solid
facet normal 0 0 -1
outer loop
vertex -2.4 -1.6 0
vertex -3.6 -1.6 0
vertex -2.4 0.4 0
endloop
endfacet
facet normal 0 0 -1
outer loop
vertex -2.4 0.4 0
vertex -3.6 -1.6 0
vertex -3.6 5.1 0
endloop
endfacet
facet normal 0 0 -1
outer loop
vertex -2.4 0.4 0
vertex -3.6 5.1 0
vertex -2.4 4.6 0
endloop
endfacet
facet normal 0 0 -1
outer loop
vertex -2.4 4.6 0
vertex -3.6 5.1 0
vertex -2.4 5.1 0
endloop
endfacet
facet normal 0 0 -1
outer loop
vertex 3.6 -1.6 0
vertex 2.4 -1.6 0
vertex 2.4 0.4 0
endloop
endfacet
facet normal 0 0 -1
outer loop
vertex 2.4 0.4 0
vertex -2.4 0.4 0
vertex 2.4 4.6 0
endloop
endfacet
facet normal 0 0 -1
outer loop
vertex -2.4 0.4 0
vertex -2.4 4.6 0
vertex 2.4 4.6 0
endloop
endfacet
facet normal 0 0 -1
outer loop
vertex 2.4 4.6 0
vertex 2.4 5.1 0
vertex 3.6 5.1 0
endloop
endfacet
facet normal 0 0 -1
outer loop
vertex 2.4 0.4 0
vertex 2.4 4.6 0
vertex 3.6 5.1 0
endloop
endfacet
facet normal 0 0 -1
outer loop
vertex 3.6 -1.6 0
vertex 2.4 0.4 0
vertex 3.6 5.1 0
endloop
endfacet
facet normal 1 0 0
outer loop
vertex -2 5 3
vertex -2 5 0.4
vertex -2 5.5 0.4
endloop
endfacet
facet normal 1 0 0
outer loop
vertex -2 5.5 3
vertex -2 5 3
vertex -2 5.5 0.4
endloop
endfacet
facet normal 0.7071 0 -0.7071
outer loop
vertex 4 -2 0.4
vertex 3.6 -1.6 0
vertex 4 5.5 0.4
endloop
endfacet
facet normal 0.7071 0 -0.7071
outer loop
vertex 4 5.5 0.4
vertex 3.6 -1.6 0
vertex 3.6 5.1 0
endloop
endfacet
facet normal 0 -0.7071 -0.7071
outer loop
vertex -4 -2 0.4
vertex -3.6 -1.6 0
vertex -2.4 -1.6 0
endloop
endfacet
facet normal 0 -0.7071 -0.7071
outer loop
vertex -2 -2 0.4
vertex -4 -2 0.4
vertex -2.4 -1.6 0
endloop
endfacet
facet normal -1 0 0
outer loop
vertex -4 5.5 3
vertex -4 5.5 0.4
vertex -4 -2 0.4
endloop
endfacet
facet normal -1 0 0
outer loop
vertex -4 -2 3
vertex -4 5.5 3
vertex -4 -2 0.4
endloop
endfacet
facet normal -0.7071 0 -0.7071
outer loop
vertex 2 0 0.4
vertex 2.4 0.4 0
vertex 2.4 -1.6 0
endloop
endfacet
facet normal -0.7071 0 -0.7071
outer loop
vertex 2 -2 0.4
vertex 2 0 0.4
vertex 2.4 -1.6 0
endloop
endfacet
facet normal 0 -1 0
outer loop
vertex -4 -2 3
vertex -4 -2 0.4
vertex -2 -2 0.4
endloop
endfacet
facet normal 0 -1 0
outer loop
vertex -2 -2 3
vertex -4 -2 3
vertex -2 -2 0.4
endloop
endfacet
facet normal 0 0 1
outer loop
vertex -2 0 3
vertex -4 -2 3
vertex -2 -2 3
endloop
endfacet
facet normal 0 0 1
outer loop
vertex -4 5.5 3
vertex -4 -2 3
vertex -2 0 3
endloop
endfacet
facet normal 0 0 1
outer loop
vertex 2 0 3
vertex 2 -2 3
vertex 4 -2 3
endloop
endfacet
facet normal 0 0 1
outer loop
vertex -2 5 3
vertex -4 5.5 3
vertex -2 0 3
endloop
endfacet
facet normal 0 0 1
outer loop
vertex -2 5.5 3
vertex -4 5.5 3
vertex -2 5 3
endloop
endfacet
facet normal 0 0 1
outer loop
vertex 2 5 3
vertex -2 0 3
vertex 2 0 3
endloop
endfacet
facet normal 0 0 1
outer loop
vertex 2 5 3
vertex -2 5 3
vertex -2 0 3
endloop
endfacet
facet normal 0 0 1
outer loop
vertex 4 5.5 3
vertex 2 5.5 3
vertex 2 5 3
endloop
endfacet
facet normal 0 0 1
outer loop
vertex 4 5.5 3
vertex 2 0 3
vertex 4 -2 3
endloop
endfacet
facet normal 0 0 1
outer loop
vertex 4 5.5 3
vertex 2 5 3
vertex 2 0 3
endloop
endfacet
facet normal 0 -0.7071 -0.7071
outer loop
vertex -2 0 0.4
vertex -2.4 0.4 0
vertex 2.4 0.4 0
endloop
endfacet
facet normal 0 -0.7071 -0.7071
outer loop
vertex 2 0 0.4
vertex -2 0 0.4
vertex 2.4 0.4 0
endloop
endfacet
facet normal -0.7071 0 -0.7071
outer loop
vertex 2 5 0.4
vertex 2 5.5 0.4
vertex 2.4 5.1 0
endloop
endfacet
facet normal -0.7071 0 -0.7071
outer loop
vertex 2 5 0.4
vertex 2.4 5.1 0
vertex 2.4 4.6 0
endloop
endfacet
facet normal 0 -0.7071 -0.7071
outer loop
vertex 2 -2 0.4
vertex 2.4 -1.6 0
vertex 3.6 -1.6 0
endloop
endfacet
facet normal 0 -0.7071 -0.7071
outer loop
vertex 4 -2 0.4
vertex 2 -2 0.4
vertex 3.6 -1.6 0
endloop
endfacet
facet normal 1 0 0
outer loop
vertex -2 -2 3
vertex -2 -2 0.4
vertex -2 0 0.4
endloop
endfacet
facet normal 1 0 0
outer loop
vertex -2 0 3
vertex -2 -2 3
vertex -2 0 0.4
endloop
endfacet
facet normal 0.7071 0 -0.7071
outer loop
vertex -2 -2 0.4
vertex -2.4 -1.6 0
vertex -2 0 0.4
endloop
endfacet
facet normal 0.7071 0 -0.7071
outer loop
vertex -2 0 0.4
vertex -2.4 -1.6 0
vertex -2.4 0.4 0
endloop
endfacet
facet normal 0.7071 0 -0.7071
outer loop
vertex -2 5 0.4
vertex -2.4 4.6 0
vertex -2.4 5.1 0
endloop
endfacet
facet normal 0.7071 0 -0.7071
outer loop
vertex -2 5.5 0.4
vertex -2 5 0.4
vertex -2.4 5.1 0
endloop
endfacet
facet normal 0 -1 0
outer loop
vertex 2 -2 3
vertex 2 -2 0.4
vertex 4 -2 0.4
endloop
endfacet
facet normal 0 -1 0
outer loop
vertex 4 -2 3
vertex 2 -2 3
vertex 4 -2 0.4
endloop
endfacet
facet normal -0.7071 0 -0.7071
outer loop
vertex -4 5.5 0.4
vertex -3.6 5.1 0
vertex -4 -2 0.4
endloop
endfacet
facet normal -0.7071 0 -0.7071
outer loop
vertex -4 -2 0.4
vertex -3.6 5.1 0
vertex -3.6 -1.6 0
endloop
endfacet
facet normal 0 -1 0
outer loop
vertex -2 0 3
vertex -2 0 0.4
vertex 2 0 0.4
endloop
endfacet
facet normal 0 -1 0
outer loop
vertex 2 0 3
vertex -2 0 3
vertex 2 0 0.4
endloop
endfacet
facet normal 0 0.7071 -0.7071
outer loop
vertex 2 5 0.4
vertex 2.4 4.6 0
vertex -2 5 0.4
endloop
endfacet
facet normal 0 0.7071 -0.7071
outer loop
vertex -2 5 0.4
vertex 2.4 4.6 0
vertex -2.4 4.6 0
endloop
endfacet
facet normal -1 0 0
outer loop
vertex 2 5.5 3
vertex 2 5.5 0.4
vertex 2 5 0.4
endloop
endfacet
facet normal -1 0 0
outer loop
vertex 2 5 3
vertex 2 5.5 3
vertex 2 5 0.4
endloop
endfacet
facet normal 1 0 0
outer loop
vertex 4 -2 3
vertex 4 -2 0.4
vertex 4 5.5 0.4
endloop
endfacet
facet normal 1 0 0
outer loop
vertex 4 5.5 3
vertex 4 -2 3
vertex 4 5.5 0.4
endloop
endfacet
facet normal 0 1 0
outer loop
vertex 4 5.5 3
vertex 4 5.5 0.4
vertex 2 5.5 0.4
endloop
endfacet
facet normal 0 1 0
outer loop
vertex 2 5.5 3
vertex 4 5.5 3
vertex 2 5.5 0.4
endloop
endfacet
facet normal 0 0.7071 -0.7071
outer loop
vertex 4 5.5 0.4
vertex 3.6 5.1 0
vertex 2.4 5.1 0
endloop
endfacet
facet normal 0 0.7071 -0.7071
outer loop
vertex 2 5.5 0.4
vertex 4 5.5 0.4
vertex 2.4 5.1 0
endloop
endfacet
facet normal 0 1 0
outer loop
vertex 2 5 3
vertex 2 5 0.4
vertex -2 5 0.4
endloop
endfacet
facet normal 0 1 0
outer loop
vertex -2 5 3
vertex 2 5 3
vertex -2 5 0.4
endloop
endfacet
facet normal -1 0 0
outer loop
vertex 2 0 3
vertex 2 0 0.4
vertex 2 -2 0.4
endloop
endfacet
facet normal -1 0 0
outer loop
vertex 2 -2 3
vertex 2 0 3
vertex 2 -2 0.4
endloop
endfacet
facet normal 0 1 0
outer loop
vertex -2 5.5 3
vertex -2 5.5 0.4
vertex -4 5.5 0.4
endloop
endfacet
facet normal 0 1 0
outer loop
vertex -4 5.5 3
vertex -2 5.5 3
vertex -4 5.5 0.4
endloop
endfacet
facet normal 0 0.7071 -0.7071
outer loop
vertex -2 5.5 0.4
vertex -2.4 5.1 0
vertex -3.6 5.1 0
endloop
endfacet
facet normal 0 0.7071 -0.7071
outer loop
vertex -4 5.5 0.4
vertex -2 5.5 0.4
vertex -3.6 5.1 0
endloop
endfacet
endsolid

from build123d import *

# Parameters (mm, degrees)
PAD_DEPTH    = 3
CHAMFER_SIZE = 0.4


with BuildPart() as part:
    # Sketch → Pad (new body)
    with BuildSketch(Plane.XY):
        Polygon((-2, -2), (-2, 0), (2, 0), (2, -2), (4, -2), (4, 5.5), (2, 5.5), (2, 5), (-2, 5), (-2, 5.5), (-4, 5.5), (-4, -2), align=None)
    extrude(amount=PAD_DEPTH)

    # Chamfer
    chamfer_edges = [part.edges().sort_by_distance(p)[0] for p in [
        (-4, 1.75, 0),
        (-3, -2, 0),
        (-2, -1, 0),
        (0, 0, 0),
        (2, -1, 0),
        (3, -2, 0),
        (4, 1.75, 0),
        (3, 5.5, 0),
        (2, 5.25, 0),
        (0, 5, 0),
        (-2, 5.25, 0),
        (-3, 5.5, 0),
    ]]
    chamfer(chamfer_edges, length=CHAMFER_SIZE)


solid = part.part
